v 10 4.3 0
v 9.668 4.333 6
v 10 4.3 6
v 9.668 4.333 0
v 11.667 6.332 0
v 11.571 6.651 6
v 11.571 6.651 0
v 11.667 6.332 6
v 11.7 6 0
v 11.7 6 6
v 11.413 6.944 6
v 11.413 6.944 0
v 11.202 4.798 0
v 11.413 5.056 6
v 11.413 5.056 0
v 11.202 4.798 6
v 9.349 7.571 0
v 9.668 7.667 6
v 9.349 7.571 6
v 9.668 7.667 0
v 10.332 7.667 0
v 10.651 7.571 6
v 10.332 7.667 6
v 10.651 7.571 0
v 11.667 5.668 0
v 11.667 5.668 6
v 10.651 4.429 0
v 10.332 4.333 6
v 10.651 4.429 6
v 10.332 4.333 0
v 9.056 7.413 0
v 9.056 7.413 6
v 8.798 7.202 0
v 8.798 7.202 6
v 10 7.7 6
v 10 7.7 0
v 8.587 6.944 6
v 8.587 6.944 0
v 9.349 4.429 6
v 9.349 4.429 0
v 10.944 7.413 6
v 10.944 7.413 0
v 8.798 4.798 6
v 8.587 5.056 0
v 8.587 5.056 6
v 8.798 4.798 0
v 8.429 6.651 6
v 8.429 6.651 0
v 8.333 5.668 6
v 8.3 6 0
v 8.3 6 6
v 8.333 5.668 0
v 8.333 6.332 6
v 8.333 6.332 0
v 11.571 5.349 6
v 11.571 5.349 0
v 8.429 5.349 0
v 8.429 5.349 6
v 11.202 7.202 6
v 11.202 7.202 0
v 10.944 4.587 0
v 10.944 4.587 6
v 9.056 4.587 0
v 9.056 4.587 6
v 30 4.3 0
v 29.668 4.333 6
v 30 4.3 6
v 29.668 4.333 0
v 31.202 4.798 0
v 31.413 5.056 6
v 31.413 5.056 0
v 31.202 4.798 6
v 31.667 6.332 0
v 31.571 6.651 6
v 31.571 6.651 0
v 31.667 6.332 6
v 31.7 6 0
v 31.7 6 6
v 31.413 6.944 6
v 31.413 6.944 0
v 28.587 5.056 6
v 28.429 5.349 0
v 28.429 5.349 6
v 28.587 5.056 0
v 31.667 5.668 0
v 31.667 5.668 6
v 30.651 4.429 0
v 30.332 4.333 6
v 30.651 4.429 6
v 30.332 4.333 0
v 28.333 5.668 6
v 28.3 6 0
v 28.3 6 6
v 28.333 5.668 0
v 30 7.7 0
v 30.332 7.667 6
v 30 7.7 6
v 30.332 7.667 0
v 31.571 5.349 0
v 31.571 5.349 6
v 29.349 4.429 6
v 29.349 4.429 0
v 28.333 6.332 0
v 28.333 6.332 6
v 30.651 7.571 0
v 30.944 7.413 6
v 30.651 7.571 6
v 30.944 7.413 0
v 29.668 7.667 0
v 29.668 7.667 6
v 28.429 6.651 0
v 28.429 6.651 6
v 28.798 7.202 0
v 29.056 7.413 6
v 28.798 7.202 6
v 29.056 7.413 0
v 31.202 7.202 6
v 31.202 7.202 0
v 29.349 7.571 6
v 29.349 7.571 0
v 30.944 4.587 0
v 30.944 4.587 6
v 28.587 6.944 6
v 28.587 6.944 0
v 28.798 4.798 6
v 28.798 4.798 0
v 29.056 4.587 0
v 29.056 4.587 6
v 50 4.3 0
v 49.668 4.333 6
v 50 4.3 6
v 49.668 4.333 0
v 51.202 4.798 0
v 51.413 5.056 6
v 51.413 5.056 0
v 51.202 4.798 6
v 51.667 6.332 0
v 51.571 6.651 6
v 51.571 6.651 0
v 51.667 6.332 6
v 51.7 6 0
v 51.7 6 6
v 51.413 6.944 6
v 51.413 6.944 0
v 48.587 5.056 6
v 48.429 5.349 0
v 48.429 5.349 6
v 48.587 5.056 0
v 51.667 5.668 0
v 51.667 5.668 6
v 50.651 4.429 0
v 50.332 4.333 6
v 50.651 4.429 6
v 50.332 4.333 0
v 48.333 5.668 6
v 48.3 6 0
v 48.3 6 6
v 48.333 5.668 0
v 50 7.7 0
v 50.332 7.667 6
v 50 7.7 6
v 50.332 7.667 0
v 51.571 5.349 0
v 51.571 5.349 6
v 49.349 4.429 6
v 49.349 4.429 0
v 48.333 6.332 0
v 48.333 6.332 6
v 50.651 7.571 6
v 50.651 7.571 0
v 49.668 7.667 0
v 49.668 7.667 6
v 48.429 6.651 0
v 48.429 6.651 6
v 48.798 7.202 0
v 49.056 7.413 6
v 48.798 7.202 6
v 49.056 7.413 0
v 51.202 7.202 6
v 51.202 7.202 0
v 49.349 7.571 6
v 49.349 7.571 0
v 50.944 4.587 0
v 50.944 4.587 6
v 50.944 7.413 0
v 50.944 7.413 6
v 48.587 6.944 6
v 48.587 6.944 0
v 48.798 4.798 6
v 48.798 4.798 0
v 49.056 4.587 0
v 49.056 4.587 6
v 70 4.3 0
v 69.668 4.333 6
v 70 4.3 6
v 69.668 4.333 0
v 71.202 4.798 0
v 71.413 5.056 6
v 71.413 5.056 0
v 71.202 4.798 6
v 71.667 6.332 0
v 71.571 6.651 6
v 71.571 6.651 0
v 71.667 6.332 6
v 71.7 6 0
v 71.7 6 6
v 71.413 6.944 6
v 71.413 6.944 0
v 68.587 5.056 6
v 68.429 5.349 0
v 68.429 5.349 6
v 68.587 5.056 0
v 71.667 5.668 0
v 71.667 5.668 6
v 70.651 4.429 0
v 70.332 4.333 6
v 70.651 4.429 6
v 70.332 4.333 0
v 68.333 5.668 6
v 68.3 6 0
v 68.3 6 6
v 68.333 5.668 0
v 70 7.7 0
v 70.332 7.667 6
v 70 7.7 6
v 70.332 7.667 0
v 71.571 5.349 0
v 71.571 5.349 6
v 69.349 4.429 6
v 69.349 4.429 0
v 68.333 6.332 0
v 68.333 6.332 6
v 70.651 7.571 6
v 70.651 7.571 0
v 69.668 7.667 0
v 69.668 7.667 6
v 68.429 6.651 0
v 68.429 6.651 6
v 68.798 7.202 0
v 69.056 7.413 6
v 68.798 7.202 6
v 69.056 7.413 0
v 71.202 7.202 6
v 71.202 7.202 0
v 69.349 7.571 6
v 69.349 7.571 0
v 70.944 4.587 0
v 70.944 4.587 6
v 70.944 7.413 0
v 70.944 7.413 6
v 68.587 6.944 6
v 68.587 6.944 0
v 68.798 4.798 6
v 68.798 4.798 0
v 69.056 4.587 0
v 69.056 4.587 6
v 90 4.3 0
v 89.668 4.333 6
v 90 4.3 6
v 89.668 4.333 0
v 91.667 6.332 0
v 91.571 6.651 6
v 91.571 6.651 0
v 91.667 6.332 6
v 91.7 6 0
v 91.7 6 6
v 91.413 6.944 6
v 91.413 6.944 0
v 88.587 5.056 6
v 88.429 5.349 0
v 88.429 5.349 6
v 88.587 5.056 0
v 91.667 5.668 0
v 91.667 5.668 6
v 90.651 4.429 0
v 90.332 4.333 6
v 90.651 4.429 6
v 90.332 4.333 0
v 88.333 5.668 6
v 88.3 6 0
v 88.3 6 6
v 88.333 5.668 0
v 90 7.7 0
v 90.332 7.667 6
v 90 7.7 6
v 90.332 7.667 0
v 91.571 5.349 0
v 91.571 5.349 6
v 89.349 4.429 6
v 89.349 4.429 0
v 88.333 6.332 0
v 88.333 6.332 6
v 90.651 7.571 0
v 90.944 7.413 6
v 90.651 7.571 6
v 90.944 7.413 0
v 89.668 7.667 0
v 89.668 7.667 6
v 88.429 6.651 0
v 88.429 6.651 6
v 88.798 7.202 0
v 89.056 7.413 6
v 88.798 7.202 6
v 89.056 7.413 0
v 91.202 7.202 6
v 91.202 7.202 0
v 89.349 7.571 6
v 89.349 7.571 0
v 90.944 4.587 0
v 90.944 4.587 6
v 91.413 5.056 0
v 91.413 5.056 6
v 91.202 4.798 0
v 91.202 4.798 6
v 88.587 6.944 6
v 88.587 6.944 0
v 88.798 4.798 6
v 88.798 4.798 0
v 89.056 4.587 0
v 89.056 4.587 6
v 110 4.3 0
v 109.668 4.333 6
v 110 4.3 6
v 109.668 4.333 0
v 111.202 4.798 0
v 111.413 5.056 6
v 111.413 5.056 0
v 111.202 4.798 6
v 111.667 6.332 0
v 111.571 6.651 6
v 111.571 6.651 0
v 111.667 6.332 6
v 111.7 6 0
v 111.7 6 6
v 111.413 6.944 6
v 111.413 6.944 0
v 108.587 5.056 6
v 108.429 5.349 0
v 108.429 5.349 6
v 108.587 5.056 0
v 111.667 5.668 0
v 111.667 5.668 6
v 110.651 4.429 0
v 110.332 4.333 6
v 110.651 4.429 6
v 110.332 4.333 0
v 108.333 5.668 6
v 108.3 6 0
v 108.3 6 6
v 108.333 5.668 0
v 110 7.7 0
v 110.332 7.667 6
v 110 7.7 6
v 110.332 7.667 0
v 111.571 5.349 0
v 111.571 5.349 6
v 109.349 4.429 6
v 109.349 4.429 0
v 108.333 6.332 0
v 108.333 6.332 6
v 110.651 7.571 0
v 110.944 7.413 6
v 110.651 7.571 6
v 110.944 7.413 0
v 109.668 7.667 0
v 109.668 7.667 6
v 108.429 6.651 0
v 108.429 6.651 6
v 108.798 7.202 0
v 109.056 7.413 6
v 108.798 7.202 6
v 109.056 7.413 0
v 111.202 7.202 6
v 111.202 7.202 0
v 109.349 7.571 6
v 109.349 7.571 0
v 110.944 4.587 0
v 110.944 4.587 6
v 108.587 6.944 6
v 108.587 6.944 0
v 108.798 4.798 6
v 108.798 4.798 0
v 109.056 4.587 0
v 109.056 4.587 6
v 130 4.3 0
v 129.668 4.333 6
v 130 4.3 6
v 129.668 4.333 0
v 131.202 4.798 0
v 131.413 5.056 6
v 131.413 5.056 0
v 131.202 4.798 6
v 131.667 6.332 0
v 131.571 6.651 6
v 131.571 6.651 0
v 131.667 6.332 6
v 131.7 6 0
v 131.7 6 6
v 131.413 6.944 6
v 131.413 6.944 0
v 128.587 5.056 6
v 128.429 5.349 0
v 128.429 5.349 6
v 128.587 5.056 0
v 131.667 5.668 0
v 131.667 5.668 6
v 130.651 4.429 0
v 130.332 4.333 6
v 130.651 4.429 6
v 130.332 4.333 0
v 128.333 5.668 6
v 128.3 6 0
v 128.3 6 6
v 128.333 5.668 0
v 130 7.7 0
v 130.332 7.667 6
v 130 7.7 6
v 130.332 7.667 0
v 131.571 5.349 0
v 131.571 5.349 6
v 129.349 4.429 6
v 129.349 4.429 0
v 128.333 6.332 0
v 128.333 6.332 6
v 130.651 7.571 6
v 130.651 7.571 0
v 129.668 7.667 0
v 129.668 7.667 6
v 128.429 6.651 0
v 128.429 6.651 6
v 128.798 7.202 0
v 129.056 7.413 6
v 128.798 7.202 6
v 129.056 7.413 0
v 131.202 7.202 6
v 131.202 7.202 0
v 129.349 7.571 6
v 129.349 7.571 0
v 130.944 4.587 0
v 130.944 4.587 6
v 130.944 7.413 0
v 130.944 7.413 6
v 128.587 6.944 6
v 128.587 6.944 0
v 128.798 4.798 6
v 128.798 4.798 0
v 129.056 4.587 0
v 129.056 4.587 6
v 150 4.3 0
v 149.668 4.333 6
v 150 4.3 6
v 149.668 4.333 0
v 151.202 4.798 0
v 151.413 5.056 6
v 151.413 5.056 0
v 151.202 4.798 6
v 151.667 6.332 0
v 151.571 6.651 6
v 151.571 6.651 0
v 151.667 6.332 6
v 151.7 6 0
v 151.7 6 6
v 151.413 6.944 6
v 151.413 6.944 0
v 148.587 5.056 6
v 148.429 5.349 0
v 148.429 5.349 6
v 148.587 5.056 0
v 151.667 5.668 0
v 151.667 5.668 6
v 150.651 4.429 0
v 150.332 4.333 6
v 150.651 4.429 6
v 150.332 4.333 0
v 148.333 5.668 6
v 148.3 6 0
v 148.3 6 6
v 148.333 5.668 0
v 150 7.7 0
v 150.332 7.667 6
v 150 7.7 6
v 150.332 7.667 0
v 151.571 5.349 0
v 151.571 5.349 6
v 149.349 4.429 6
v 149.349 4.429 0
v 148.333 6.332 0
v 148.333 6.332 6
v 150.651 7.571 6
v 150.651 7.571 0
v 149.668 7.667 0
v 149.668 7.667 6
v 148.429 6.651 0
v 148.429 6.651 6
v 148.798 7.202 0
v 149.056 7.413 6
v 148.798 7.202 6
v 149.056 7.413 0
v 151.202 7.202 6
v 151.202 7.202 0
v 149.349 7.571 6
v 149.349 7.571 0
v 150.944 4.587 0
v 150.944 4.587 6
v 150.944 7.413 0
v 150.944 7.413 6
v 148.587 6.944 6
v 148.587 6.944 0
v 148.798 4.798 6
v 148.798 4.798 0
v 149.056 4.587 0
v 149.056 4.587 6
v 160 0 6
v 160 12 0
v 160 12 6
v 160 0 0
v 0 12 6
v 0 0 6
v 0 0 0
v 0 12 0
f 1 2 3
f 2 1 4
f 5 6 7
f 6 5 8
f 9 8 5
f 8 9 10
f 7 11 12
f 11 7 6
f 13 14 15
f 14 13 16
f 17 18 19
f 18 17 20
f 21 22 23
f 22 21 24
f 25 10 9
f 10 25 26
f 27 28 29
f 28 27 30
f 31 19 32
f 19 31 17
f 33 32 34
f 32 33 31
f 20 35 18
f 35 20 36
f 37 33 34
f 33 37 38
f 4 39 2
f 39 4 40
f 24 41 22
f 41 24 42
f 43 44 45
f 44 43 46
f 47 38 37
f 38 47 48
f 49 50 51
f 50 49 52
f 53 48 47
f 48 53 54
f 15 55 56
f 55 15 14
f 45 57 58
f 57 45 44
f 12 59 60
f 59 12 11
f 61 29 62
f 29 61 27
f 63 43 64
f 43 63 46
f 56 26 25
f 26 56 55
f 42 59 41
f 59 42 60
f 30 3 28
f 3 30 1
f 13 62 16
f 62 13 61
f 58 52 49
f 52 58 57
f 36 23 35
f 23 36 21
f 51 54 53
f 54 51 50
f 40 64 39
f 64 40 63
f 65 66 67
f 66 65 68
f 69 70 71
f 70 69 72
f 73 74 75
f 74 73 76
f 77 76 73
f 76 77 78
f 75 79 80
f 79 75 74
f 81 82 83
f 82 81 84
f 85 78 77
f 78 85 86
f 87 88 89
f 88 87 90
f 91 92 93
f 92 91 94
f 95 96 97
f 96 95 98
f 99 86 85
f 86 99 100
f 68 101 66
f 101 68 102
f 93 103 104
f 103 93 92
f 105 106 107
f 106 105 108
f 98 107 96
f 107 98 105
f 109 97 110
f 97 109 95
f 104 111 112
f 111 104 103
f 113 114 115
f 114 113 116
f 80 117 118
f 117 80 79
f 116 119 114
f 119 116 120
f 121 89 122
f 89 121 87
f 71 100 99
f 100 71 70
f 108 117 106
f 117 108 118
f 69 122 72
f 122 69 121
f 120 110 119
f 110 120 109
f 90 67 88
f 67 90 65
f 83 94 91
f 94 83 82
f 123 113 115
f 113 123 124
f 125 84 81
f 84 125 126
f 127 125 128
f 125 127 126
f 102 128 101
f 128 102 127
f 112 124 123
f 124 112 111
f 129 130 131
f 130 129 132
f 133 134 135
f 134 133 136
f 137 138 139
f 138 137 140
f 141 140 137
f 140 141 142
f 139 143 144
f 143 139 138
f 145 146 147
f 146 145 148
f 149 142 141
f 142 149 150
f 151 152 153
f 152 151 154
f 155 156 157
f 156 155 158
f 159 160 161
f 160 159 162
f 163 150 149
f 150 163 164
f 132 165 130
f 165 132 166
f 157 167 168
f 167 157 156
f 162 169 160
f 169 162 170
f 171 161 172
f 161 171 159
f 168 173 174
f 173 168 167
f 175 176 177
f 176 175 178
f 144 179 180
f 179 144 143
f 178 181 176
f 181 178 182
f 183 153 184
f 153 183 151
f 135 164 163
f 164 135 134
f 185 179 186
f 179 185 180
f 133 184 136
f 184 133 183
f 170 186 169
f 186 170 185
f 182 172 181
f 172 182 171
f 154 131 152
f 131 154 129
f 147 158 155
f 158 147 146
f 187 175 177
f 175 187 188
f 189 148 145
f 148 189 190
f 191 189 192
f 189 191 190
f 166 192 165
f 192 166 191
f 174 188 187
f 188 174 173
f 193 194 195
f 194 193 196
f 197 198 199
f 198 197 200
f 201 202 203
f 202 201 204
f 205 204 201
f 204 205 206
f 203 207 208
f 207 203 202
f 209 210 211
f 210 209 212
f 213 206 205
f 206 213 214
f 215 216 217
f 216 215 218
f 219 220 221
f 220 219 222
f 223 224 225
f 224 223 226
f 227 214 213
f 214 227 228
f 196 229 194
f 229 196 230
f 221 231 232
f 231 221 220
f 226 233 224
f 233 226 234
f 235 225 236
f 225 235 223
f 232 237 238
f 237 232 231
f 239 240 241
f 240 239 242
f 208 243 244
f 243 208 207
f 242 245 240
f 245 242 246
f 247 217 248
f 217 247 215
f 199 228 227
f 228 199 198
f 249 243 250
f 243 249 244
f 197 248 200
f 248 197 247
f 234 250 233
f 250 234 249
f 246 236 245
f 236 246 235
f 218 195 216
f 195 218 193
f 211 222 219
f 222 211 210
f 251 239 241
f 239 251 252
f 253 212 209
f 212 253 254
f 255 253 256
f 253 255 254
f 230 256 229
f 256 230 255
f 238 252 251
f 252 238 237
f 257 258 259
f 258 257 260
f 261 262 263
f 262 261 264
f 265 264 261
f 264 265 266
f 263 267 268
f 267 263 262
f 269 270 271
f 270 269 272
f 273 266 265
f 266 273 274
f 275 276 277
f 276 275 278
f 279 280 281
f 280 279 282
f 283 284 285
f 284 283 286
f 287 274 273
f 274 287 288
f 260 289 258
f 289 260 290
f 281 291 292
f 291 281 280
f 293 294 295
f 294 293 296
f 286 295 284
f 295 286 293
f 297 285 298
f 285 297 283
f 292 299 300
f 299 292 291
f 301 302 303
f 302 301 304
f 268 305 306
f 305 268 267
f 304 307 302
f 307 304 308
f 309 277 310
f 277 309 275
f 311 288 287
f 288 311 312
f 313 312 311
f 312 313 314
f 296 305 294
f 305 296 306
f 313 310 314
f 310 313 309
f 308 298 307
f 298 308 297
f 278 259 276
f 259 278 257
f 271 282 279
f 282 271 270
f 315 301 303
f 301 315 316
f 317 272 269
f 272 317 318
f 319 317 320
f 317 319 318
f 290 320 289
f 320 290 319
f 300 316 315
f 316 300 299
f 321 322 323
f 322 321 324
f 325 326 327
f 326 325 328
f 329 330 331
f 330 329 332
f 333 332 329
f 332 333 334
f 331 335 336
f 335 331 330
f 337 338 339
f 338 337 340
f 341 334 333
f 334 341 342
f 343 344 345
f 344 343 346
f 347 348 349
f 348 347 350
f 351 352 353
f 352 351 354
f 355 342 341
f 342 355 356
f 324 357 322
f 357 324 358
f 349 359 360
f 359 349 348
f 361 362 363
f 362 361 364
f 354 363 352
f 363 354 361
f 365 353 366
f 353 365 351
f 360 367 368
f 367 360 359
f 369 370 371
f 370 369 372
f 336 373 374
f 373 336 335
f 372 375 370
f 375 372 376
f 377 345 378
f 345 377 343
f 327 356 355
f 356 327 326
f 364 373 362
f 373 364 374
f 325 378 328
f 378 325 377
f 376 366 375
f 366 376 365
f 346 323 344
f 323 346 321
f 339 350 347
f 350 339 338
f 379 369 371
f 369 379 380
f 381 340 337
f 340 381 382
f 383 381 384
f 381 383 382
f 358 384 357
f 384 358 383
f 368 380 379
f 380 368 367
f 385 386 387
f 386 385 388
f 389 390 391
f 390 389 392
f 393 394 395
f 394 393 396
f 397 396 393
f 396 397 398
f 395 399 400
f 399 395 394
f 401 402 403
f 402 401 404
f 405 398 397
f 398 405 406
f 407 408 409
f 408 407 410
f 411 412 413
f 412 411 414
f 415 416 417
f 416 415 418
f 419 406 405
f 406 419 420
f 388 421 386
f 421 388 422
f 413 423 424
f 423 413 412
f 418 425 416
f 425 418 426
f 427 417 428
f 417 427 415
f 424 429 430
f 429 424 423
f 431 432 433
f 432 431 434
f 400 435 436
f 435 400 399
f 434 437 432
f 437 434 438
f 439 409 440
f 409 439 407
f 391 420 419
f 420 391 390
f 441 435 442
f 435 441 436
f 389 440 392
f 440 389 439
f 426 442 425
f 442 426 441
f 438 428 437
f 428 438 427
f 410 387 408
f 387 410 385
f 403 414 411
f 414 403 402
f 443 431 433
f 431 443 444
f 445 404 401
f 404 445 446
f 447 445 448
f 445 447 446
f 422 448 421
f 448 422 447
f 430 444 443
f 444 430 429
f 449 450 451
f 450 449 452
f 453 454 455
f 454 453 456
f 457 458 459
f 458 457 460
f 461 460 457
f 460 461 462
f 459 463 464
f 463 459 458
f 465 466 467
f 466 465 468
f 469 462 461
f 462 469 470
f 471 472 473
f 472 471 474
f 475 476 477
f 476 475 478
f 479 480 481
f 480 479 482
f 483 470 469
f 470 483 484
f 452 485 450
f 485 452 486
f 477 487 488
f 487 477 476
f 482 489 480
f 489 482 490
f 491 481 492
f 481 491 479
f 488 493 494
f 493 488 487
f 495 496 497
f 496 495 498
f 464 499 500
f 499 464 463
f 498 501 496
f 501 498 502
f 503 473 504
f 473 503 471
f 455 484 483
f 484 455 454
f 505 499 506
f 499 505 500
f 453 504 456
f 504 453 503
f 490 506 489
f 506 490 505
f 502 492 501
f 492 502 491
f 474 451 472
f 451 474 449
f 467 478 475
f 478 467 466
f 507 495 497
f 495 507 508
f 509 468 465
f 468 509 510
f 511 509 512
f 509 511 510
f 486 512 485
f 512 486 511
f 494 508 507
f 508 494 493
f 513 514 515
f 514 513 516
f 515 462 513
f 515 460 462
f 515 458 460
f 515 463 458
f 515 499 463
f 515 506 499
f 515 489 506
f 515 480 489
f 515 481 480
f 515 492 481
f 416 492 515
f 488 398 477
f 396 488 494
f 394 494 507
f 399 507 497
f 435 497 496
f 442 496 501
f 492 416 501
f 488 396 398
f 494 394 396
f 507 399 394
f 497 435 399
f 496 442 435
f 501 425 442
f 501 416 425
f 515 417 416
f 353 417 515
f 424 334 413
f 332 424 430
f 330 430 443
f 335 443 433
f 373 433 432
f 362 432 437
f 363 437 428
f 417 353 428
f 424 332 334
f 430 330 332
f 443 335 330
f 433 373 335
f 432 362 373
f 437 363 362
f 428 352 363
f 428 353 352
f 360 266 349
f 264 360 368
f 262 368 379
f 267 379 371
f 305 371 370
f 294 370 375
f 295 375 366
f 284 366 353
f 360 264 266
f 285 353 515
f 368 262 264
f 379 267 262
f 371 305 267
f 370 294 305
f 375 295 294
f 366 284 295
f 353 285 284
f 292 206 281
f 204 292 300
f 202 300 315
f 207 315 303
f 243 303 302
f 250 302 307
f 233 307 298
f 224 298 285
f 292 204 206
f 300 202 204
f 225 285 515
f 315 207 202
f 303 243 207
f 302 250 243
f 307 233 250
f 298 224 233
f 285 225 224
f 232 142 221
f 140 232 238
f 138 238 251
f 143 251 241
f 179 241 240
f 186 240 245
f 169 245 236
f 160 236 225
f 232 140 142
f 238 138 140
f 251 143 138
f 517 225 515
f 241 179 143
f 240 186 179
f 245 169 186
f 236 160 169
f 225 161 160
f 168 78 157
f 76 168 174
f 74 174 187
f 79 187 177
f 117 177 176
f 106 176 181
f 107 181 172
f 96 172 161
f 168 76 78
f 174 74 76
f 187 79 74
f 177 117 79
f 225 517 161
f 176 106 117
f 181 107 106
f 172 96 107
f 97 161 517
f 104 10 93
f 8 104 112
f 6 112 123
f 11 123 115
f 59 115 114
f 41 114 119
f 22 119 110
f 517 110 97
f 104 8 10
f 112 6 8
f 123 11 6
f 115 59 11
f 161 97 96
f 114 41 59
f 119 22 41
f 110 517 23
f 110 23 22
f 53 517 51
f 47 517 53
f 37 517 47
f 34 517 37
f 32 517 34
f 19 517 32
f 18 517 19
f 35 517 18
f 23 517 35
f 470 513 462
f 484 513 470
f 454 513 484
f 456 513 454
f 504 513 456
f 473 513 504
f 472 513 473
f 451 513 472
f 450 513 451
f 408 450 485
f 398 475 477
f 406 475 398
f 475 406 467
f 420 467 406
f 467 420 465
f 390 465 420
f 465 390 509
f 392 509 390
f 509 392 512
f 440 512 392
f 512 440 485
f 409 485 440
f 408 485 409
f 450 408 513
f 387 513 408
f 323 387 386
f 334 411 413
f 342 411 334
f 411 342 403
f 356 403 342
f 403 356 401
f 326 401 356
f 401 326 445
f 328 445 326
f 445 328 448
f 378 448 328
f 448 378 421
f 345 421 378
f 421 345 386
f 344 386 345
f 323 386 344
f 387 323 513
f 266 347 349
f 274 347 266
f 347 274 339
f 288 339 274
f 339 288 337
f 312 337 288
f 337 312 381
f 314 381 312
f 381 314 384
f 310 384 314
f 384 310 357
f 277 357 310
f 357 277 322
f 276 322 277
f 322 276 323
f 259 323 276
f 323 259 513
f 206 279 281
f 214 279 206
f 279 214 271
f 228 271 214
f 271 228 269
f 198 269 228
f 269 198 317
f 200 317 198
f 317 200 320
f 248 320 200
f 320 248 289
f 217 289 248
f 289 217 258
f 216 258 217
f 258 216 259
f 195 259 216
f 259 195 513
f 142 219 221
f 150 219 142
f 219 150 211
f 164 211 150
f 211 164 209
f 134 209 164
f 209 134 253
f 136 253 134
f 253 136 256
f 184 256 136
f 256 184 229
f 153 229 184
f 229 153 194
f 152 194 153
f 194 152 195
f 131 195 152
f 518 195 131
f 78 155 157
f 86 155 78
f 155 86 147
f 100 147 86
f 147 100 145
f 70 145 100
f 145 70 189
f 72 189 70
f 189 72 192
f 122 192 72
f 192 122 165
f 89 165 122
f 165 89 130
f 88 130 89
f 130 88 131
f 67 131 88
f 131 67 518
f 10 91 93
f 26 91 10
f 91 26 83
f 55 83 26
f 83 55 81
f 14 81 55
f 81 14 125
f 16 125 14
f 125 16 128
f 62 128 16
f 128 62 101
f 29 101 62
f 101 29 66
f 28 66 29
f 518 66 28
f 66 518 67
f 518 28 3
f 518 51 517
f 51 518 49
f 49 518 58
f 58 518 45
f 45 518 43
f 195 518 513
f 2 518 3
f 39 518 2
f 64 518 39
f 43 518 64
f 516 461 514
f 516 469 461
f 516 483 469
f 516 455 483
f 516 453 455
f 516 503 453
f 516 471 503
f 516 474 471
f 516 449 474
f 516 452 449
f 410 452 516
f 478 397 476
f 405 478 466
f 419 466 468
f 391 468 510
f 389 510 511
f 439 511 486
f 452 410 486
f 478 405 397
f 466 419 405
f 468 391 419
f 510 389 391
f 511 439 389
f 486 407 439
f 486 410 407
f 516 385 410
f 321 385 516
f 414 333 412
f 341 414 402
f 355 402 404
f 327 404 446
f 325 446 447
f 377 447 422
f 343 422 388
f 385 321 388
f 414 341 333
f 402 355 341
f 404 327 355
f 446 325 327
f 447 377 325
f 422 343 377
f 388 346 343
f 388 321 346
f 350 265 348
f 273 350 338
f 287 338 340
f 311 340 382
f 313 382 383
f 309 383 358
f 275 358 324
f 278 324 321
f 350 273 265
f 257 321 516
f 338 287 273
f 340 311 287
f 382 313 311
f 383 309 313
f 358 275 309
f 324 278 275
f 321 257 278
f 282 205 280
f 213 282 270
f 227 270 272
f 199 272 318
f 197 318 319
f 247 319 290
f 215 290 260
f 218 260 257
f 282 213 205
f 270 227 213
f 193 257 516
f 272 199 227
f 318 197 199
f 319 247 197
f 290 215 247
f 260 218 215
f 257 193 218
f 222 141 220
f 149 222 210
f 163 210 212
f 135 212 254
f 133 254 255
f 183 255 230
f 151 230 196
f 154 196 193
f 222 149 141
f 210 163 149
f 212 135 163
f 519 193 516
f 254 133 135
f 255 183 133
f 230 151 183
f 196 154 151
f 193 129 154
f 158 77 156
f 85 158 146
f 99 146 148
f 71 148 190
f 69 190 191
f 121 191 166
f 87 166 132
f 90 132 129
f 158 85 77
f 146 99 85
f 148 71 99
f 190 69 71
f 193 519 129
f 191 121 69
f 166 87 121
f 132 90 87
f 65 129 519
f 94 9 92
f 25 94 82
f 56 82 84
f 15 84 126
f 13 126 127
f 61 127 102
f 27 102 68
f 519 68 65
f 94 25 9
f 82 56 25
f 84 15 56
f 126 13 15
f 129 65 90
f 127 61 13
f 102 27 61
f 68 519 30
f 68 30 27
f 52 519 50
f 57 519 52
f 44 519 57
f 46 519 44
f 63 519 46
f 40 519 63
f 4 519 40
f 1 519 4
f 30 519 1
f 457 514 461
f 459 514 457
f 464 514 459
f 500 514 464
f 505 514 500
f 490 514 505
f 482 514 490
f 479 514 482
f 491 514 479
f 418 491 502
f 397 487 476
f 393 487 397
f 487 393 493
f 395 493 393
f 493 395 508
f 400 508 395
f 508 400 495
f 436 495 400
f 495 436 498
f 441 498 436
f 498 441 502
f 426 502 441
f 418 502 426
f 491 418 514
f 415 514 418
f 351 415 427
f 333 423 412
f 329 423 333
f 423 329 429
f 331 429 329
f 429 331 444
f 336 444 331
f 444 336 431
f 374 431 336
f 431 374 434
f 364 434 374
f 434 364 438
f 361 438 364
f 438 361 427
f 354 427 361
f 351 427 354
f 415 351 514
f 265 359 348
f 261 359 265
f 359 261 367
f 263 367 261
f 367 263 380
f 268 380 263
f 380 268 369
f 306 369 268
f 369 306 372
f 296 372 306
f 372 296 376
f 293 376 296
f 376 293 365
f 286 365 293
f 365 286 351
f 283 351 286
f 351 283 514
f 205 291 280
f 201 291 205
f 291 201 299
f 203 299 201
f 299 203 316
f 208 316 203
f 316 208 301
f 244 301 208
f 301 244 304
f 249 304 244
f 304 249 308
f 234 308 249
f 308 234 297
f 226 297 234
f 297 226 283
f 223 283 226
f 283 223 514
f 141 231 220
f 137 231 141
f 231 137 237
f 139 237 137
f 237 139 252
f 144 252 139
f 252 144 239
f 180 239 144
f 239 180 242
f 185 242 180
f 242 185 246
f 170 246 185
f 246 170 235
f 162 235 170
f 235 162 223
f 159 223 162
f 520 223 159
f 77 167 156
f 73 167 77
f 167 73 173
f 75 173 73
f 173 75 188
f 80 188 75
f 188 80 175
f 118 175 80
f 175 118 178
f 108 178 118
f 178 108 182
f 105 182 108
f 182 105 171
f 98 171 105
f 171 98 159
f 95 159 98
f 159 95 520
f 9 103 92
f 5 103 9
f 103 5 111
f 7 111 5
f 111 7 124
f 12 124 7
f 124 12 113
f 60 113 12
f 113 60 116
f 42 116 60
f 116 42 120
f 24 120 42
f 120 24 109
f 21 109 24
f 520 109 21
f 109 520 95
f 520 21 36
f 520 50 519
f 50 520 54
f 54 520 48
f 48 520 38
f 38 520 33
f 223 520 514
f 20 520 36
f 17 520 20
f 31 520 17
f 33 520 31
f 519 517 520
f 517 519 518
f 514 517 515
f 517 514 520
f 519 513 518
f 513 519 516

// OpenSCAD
// ModuDeck donor chassis study: NOT a verified ThinkPad fit.
// Millimetres. 370x240 is an unconfirmed owner measurement.
$fn=32; W=370; D=240; t=3;
module plate(w,d,h){cube([w,d,h]);}
module shell(w,d,h){difference(){cube([w,d,h]);translate([t,t,t])cube([w-2*t,d-2*t,h]);}}
module hole(x,y,h){translate([x,y,-1])cylinder(d=3.4,h=h+2);}
module rail(n){difference(){cube([n,12,6]);for(x=[10:20:n-10])hole(x,6,6);}}
module rear(){difference(){cube([W-6,3,25]);translate([W/2-23,-1,6])cube([40,5,14]);for(x=[10,W-16])translate([x,-1,12])rotate([-90,0,0])cylinder(d=3.4,h=5);}}
module tray(){difference(){shell(W,D,30);translate([3,D-4,3])cube([W-6,6,27]);for(x=[15,W-15],y=[15,D-15])hole(x,y,30);}}
rail(160);
